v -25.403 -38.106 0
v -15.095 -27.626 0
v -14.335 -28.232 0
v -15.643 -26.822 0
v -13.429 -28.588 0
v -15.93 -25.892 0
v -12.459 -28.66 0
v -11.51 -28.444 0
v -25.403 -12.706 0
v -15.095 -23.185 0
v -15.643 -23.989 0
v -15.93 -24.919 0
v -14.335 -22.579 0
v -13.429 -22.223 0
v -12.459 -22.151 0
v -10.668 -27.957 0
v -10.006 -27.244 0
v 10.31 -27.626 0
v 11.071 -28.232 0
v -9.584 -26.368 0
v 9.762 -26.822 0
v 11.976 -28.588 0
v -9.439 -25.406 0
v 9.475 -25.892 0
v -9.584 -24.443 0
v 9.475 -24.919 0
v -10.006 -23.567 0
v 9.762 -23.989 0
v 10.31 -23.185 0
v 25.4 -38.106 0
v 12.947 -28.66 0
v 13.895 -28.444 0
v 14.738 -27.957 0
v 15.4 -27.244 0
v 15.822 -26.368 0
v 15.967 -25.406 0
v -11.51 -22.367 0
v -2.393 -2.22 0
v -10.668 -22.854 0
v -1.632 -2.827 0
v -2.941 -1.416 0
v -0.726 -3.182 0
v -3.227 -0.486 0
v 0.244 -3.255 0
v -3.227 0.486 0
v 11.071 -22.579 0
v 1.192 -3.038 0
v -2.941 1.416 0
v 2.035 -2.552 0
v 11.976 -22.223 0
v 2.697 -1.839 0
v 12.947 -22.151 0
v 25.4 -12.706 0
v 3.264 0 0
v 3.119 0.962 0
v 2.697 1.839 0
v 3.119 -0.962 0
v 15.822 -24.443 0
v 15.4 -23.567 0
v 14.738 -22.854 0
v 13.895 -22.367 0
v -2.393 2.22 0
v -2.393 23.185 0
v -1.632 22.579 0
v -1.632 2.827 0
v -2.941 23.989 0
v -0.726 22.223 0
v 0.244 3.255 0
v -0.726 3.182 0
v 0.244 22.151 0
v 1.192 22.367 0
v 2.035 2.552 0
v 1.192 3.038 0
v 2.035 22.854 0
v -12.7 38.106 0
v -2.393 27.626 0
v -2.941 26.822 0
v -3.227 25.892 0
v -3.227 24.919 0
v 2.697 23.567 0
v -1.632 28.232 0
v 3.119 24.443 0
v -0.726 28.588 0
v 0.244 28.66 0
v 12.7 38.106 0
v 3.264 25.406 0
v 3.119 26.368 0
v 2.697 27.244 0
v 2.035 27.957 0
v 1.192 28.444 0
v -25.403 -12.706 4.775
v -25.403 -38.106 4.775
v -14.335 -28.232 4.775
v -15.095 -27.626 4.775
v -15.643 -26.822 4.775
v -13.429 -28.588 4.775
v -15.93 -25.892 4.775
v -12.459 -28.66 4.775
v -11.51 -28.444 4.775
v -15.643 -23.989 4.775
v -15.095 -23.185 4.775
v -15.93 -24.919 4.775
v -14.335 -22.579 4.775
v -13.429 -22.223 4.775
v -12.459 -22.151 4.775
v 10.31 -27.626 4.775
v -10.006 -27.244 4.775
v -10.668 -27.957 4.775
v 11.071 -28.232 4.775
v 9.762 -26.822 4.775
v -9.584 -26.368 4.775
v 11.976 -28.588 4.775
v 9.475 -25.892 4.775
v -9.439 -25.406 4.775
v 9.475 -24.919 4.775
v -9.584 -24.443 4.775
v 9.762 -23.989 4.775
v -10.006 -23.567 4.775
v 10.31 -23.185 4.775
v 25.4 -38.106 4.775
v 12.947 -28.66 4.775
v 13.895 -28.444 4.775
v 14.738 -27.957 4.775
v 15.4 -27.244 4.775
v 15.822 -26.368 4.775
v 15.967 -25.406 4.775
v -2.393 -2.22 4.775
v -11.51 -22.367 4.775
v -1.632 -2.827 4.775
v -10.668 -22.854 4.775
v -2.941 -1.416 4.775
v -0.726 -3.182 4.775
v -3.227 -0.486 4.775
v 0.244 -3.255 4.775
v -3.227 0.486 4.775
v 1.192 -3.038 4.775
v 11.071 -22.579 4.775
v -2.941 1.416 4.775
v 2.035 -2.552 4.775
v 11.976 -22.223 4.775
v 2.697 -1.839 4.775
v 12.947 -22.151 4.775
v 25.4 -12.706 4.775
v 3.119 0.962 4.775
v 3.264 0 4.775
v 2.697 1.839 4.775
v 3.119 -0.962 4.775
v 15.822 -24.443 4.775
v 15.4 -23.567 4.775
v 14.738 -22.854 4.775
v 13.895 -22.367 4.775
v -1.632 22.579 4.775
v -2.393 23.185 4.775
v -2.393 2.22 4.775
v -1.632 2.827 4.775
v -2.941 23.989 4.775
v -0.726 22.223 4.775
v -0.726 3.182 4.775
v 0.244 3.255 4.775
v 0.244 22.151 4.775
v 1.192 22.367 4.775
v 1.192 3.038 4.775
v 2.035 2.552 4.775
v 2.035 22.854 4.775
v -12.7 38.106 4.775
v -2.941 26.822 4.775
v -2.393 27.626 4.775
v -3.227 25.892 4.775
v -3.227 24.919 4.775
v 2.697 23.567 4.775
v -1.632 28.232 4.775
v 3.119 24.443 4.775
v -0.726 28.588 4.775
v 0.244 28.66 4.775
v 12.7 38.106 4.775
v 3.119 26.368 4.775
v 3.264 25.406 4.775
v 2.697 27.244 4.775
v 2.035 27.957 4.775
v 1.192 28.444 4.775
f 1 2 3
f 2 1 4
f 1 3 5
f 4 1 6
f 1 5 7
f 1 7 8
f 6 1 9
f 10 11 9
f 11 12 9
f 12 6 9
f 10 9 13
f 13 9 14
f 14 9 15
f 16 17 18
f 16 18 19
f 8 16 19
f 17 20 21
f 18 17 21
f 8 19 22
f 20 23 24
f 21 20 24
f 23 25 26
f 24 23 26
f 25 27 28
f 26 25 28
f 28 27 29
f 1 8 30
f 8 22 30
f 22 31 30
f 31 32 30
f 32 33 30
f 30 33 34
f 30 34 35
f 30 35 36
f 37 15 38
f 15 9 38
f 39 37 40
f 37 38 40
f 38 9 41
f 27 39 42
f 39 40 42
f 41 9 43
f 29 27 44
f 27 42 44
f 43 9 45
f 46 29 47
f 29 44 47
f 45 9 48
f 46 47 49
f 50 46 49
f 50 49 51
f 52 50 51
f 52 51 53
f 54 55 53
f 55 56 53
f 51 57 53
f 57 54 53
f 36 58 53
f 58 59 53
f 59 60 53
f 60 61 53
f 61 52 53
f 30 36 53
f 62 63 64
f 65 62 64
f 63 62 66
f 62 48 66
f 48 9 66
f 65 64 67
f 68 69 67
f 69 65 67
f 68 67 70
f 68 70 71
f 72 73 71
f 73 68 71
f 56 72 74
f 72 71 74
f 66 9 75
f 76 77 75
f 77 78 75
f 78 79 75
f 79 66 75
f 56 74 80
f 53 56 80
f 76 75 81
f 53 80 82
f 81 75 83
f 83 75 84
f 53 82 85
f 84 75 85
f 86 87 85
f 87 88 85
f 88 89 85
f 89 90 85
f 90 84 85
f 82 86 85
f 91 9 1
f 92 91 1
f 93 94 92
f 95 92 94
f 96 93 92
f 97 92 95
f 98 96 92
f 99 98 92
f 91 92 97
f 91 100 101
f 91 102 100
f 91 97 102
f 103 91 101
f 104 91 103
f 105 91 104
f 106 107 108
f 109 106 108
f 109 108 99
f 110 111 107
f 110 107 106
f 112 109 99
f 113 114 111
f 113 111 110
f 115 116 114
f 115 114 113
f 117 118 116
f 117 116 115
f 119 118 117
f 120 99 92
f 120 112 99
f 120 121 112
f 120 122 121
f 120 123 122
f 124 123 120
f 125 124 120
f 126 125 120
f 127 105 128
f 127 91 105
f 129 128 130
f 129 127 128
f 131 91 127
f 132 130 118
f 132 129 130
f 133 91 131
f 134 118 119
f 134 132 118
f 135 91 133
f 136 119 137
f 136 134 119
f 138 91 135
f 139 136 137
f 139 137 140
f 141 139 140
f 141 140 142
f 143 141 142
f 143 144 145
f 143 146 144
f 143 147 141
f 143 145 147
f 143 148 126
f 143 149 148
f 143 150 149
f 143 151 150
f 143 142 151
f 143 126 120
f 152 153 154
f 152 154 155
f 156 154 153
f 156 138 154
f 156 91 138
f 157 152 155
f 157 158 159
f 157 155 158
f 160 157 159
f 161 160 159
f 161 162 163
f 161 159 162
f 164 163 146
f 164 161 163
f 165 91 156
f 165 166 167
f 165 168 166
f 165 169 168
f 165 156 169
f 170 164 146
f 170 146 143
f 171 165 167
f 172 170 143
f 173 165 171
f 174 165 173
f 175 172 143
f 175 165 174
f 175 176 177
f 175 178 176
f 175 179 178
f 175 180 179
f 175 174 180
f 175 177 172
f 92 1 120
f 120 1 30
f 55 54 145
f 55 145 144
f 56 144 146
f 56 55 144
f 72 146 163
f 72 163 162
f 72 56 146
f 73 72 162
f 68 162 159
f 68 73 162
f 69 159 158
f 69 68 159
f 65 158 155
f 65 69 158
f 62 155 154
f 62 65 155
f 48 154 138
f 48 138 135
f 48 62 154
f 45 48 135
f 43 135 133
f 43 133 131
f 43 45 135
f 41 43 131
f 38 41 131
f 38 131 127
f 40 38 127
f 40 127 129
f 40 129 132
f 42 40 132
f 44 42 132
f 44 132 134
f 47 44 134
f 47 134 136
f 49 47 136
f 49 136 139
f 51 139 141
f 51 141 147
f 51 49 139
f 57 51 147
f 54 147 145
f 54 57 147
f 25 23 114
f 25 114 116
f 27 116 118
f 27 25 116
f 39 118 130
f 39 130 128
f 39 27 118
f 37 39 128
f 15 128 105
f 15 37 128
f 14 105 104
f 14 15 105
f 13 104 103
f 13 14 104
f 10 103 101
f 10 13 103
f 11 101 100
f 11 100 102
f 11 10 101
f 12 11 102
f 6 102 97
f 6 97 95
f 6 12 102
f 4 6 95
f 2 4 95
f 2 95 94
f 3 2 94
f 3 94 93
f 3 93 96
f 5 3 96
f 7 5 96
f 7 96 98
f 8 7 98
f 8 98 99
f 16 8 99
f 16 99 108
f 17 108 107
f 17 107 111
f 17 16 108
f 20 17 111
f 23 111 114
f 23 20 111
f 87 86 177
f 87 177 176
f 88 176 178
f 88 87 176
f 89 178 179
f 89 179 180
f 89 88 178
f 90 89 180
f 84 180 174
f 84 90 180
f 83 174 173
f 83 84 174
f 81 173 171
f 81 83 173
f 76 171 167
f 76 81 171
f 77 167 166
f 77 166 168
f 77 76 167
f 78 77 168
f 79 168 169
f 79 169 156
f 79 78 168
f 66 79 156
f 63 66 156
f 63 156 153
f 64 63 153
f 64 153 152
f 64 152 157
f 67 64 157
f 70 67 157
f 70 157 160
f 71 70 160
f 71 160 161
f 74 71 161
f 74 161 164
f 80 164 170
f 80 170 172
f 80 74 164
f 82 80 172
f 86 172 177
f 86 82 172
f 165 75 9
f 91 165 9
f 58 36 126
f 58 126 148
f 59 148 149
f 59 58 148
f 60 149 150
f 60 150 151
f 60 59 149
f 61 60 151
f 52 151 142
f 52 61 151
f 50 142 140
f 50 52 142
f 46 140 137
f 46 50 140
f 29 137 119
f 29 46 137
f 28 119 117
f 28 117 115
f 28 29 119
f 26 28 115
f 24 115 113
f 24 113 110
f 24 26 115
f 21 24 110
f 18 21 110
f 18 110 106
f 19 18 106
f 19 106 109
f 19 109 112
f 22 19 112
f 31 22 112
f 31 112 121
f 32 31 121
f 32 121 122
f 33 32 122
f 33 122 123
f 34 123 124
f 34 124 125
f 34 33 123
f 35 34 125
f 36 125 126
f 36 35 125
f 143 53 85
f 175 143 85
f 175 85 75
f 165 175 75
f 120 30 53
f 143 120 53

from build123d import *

# Parameters (mm, degrees)
F0_R     = 3.2639
F1_DEPTH = 4.7752


with BuildPart() as f1:
    # F0 (on Top) → F1 (new body)
    with BuildSketch(Plane.XY):
        Polygon((25.4, -12.70551), (12.7, 38.10551), (-12.7, 38.10551), (-25.402755, -12.70551), (-25.402755, -38.10551), (25.4, -38.10551), align=None)
        with Locations((-12.702755, -25.40551)):
            Circle(F0_R, mode=Mode.SUBTRACT)
        with Locations((12.702755, -25.40551)):
            Circle(F0_R, mode=Mode.SUBTRACT)
        Circle(F0_R, mode=Mode.SUBTRACT)
        with Locations((0, 25.40551)):
            Circle(F0_R, mode=Mode.SUBTRACT)
    extrude(amount=F1_DEPTH)


solid = f1.part
